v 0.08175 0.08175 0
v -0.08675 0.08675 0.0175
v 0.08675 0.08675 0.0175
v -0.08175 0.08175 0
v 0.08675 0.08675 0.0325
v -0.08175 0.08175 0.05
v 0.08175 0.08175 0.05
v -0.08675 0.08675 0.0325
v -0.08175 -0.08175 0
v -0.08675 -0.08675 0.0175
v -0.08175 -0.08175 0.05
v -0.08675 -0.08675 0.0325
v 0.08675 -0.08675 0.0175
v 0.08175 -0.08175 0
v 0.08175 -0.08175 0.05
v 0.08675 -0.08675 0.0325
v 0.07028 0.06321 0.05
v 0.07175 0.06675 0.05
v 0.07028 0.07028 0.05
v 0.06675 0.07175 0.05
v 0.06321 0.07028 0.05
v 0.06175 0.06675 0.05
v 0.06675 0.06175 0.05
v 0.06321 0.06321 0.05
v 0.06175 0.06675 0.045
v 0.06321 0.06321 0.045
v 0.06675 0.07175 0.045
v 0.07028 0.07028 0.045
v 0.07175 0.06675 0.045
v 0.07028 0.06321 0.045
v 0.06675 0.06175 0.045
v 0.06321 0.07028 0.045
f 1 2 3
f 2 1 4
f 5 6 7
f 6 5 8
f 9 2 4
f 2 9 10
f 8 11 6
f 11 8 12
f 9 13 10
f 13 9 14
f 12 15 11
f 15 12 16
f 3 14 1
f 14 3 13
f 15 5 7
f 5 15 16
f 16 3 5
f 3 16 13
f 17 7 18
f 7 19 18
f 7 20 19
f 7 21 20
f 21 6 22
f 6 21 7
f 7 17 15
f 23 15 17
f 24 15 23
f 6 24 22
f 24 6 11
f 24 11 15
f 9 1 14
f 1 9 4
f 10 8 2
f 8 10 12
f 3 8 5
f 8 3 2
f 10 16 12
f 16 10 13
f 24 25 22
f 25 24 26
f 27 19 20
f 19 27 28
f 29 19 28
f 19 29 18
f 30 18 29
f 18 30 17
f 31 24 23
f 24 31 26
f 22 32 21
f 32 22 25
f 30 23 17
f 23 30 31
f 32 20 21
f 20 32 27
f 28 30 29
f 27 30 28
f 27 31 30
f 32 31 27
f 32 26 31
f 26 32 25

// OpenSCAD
// file: DataSymbol.scad
boxSize = 0.029;
lineSize = 0.0045;
symDepth = 0.01;
vertSeparation = 0.019;
horizSeparation = 0.018;

module DataSymbol() {
  boxVertCenter = (boxSize+vertSeparation)/2;
  boxHorizCenter = (boxSize+horizSeparation)/2;
  linear_extrude(symDepth, center=true) {
    translate([0,boxVertCenter]) square(boxSize, center=true); // top box
    translate([-boxHorizCenter,-boxVertCenter]) square(boxSize, center=true); // bottom left box
    translate([boxHorizCenter,-boxVertCenter]) square(boxSize, center=true); // bottom right box
    square([2*boxHorizCenter + lineSize, lineSize], center=true); // middle line
    translate([0, horizSeparation/4]) square([lineSize, horizSeparation/2 + lineSize], center=true); // line to top
    translate([-boxHorizCenter, -horizSeparation/4]) square([lineSize, horizSeparation/2 + lineSize], center=true); // line to bottom left
    translate([boxHorizCenter, -horizSeparation/4]) square([lineSize, horizSeparation/2 + lineSize], center=true); // line to bottom right
  }
}

DataSymbol();
// file: PowerSymbol.scad
symWidth = 0.038;
symHeight = 0.086;
symDepth = 0.01;
middleHeight = 0.0075;
topHorizOffset = 0.007;
sideVertOffset = 0.007;

module PowerSymbol() {
  linear_extrude(symDepth, center=true) {
    halfHei = symHeight/2;
    halfWid = symWidth/2;
    halfMid = middleHeight/2;
    polygon([
      [topHorizOffset, halfHei],
      [0, halfMid],
      [halfWid, sideVertOffset],
      [-topHorizOffset, -halfHei],
      [0, -halfMid],
      [-halfWid, -sideVertOffset]
    ]);
  }
}

PowerSymbol();
// file: BasicFPGAHousing_paintcap.scad
include <FPGA_shared.scad>;
use <BasicFPGAHousing_base.scad>;

module BasicFPGAHousing_paintcap() {
  bevelDepth = capBevel * sqrt(2);
  difference() {
    translate([0,0,baseTop]) {
      cube(size=[capSize, capSize, capDepth*2], center=true);
    }
    cube(size=[slotSize+eps, slotSize+eps, smallGridSize], center=true);
    for (edge=[1:4]) rotate([0,0,90*edge]) {
      translate([0,capSize/2,baseTop+capDepth]) rotate([45,0,0])
        cube(size=[capSize+0.1, bevelDepth, bevelDepth*2], center=true);
    }
  }
}

%BasicFPGAHousing_base();
BasicFPGAHousing_paintcap();
// file: BasicFPGAHousing_base.scad
include <FPGA_shared.scad>;
use <BasicFPGAHousing_paintcap.scad>;
use <PowerSymbol.scad>;
use <DataSymbol.scad>;

module BasiFPGAHousing_chipcutout() {
  slotPinBaseOffset = (-slotPinEdgeCount-1)/2 * slotPinEdgeSpacing;
  slotPinEdgeOffset = slotSize/2 - slotPinSize/2 - slotPinEdgePad;
  union() {
    translate([0, 0, baseDepth/2 + slotBottom + slotPinDepth]) {
      cube(size=[slotSize, slotSize, baseDepth], center=true);
    }
    for(edge=[1:4]) rotate([0,0,90*edge]) {
      for(i=[1:slotPinEdgeCount]) {
        translate([
          slotPinBaseOffset + slotPinEdgeSpacing*i,
          slotPinEdgeOffset,
          slotBottom + slotPinDepth
        ]) {
          cube(size=[slotPinSize, slotPinSize, slotPinDepth*2], center=true);
        }
      }
    }
    translate([alignHoleOffset,alignHoleOffset,slotBottom + slotPinDepth])
      cylinder(h=alignHoleDepth*2, r=alignHoleRadius, center=true, $fn=alignHoleSides);
  }
}

module BasicFPGAHousing_base() {
  middleSize = (slotSize + capSize) / 2;
  difference() {
    union() {
      translate([0,0,baseCenter])
        cube(size=[baseSize, baseSize, baseDepth], center=true);
      translate([0,0,baseTop-eps])
        cube(size=[middleSize, middleSize, capDepth*2], center=true);
    }
    translate([0,0,baseBottom])
      cube(size=[baseBackCutoutSize, baseBackCutoutSize, baseBackCutoutDepth*2], center=true);
    BasiFPGAHousing_chipcutout();
    cablecutout();
    rotate([0,0,180]) cablecutout();
  }
}

BasicFPGAHousing_base();
%BasicFPGAHousing_paintcap();
%translate([0.067,0.25,-0.001]) rotate([-90, 0, 0]) PowerSymbol();
%translate([0.073,-0.25,0.001]) rotate([90, 0, 0]) DataSymbol();
// file: BasicFPGAChip_pins.scad
include <FPGA_shared.scad>;
use <BasicFPGAChip_base.scad>;

module FPGAPin() {
  pinTop = chipTotalHeight/2 - chipBaseHeight/2 + pinHorizHeight/2;
  pinVCenter = pinTop - pinTotalHeight/2;
  pinBottomInnerEdge = pinHorizUnderLength + pinVertInnerOffset;
  pinInnerHeight = pinTotalHeight - pinHorizHeight;
  pinInnerAngle = atan2(-pinVertInnerOffset, pinInnerHeight);
  pinInnerCutoutHeight = pinInnerHeight / cos(pinInnerAngle);
  pinBottomOuterEdge = pinHorizLength - pinVertOuterOffset;
  pinOuterAngle = atan2(pinVertOuterOffset, pinTotalHeight);
  pinBottomNarrowEdge = pinHorizWidth/2 - pinVertNarrowOffset;
  pinNarrowAngle = atan2(pinVertNarrowOffset, pinTotalHeight);
  translate([0,0,pinVCenter]) difference() {
    translate([0, 0, 0])
      cube(size=[pinHorizLength*2, pinHorizWidth, pinTotalHeight], center=true);
    translate([pinHorizUnderLength-pinHorizLength, 0, -pinHorizHeight])
      cube(size=[pinHorizLength*2, pinHorizWidth*2, pinTotalHeight], center=true);
    translate([pinBottomInnerEdge,0,-pinHorizHeight/2-pinInnerHeight/2])
      rotate([0,pinInnerAngle,0])
      translate([-pinVertInnerOffset,0,0])
        cube(size=[pinVertInnerOffset*2, pinHorizWidth*2, pinInnerCutoutHeight*2], center=true);
    translate([pinBottomOuterEdge,0,-pinTotalHeight/2])
      rotate([0,pinOuterAngle,0])
      translate([pinVertOuterOffset,0,0])
        cube(size=[pinVertOuterOffset*2, pinHorizWidth*2, pinTotalHeight*4], center=true);
    translate([0,pinBottomNarrowEdge,-pinTotalHeight/2])
      rotate([-pinNarrowAngle,0,0])
      translate([0,pinVertNarrowOffset,0])
        cube(size=[pinHorizLength*4,pinVertNarrowOffset*2, pinTotalHeight*4], center=true);
    translate([0,-pinBottomNarrowEdge,-pinTotalHeight/2])
      rotate([pinNarrowAngle,0,0])
      translate([0,-pinVertNarrowOffset,0])
        cube(size=[pinHorizLength*4,pinVertNarrowOffset*2, pinTotalHeight*4], center=true);
  }
}

module BasicFPGAChip_pins() {
  for (edge=[0:3])
    for (off=[1:slotPinEdgeCount])
      rotate([0,0,90*edge])
        translate([chipBaseSize/2, slotPinEdgeSpacing * (off - (slotPinEdgeCount+1)/2), 0])
        FPGAPin();
}

BasicFPGAChip_pins();
%BasicFPGAChip_base();
// file: BasicFPGAHousing_full.scad
use <BasicFPGAHousing_base.scad>;
use <BasicFPGAHousing_paintcap.scad>;
use <PowerSymbol.scad>;
use <DataSymbol.scad>;

module BasicFPGAHousing_full() {
  BasicFPGAHousing_base();
  BasicFPGAHousing_paintcap();
  translate([0.067,0.25,-0.001]) rotate([-90, 0, 0]) PowerSymbol();
  translate([0.073,-0.25,0.001]) rotate([90, 0, 0]) DataSymbol();
}

BasicFPGAHousing_full();
// file: FPGA_shared.scad
smallGridSize = 0.5;
baseSize = smallGridSize;
baseTop = 0.05;
baseBottom = -0.045;
baseDepth = baseTop - baseBottom;
baseCenter = (baseTop + baseBottom)/2;
baseBackRim = 0.02;
baseBackCutoutSize = baseSize - baseBackRim*2;
baseBackCutoutDepth = 0.01;
capSize = 0.41;
capDepth = 0.045;
capBevel = 0.01;
slotSize = smallGridSize * 0.5;
slotBottom = 0.03;
slotPinEdgeCount = 4;
slotPinEdgePad = 0.01;
slotPinEdgeSpacing = 0.045;
slotPinSize = 0.025;
slotPinDepth = 0.025;
eps = 0.00001;
chipTotalSize = slotSize - slotPinEdgePad*2 - slotPinSize/2;
chipTotalHeight = 0.1;
chipBaseHeight = 0.05;
pinHorizLength = 0.022;
pinHorizUnderLength = 0.008;
pinHorizWidth = 0.02;
pinHorizHeight = 0.015;
pinVertInnerOffset = 0.003;
pinVertOuterOffset = 0.003;
pinVertNarrowOffset = 0.003;
pinTotalHeight = chipTotalHeight - chipBaseHeight/2 + pinHorizHeight/2;
chipBaseSize = chipTotalSize - pinHorizLength*2;
chipBaseBevelSize = 0.005;
alignHoleRadius = 0.005;
alignHoleOffset = chipBaseSize/2 - 0.02;
alignHoleDepth = 0.005;
alignHoleSides = 8;

module cablecutout() {
  cableradius = 0.025;
  cableDepth = 0.0125;
  translate([0,smallGridSize/2,0]) rotate([90,0,0]) {
    cylinder(h=cableDepth*2, r=cableradius, center=true, $fn=8);
  }
}
// main file
include <FPGA_shared.scad>;
use <BasicFPGAHousing_full.scad>;
use <BasicFPGAChip_pins.scad>;

module BasicFPGAChip_base() {
  bevelHeight = (chipBaseHeight - pinHorizHeight)/2;
  bevelAngle = atan2(chipBaseBevelSize, bevelHeight);
  translate([0, 0, chipTotalHeight/2 - chipBaseHeight/2]) difference() {
    cube(size=[chipBaseSize, chipBaseSize, chipBaseHeight], center=true);
    for (side=[0:3]) rotate([0,0,90*side])
      for (vside = [-1:2:1])
        translate([0,chipBaseSize/2,vside*pinHorizHeight/2])
          rotate([vside*bevelAngle,0,0])
          translate([0,chipBaseBevelSize,0])
            cube(size=[chipBaseSize*2,chipBaseBevelSize*2,bevelHeight*4], center=true);
    translate([alignHoleOffset,alignHoleOffset,chipBaseHeight/2])
      cylinder(h=alignHoleDepth*2, r=alignHoleRadius, center=true, $fn=alignHoleSides);
  }
}

BasicFPGAChip_base();
%BasicFPGAChip_pins();
*%translate([0,0,-slotBottom-chipTotalHeight/2]) BasicFPGAHousing_full();
